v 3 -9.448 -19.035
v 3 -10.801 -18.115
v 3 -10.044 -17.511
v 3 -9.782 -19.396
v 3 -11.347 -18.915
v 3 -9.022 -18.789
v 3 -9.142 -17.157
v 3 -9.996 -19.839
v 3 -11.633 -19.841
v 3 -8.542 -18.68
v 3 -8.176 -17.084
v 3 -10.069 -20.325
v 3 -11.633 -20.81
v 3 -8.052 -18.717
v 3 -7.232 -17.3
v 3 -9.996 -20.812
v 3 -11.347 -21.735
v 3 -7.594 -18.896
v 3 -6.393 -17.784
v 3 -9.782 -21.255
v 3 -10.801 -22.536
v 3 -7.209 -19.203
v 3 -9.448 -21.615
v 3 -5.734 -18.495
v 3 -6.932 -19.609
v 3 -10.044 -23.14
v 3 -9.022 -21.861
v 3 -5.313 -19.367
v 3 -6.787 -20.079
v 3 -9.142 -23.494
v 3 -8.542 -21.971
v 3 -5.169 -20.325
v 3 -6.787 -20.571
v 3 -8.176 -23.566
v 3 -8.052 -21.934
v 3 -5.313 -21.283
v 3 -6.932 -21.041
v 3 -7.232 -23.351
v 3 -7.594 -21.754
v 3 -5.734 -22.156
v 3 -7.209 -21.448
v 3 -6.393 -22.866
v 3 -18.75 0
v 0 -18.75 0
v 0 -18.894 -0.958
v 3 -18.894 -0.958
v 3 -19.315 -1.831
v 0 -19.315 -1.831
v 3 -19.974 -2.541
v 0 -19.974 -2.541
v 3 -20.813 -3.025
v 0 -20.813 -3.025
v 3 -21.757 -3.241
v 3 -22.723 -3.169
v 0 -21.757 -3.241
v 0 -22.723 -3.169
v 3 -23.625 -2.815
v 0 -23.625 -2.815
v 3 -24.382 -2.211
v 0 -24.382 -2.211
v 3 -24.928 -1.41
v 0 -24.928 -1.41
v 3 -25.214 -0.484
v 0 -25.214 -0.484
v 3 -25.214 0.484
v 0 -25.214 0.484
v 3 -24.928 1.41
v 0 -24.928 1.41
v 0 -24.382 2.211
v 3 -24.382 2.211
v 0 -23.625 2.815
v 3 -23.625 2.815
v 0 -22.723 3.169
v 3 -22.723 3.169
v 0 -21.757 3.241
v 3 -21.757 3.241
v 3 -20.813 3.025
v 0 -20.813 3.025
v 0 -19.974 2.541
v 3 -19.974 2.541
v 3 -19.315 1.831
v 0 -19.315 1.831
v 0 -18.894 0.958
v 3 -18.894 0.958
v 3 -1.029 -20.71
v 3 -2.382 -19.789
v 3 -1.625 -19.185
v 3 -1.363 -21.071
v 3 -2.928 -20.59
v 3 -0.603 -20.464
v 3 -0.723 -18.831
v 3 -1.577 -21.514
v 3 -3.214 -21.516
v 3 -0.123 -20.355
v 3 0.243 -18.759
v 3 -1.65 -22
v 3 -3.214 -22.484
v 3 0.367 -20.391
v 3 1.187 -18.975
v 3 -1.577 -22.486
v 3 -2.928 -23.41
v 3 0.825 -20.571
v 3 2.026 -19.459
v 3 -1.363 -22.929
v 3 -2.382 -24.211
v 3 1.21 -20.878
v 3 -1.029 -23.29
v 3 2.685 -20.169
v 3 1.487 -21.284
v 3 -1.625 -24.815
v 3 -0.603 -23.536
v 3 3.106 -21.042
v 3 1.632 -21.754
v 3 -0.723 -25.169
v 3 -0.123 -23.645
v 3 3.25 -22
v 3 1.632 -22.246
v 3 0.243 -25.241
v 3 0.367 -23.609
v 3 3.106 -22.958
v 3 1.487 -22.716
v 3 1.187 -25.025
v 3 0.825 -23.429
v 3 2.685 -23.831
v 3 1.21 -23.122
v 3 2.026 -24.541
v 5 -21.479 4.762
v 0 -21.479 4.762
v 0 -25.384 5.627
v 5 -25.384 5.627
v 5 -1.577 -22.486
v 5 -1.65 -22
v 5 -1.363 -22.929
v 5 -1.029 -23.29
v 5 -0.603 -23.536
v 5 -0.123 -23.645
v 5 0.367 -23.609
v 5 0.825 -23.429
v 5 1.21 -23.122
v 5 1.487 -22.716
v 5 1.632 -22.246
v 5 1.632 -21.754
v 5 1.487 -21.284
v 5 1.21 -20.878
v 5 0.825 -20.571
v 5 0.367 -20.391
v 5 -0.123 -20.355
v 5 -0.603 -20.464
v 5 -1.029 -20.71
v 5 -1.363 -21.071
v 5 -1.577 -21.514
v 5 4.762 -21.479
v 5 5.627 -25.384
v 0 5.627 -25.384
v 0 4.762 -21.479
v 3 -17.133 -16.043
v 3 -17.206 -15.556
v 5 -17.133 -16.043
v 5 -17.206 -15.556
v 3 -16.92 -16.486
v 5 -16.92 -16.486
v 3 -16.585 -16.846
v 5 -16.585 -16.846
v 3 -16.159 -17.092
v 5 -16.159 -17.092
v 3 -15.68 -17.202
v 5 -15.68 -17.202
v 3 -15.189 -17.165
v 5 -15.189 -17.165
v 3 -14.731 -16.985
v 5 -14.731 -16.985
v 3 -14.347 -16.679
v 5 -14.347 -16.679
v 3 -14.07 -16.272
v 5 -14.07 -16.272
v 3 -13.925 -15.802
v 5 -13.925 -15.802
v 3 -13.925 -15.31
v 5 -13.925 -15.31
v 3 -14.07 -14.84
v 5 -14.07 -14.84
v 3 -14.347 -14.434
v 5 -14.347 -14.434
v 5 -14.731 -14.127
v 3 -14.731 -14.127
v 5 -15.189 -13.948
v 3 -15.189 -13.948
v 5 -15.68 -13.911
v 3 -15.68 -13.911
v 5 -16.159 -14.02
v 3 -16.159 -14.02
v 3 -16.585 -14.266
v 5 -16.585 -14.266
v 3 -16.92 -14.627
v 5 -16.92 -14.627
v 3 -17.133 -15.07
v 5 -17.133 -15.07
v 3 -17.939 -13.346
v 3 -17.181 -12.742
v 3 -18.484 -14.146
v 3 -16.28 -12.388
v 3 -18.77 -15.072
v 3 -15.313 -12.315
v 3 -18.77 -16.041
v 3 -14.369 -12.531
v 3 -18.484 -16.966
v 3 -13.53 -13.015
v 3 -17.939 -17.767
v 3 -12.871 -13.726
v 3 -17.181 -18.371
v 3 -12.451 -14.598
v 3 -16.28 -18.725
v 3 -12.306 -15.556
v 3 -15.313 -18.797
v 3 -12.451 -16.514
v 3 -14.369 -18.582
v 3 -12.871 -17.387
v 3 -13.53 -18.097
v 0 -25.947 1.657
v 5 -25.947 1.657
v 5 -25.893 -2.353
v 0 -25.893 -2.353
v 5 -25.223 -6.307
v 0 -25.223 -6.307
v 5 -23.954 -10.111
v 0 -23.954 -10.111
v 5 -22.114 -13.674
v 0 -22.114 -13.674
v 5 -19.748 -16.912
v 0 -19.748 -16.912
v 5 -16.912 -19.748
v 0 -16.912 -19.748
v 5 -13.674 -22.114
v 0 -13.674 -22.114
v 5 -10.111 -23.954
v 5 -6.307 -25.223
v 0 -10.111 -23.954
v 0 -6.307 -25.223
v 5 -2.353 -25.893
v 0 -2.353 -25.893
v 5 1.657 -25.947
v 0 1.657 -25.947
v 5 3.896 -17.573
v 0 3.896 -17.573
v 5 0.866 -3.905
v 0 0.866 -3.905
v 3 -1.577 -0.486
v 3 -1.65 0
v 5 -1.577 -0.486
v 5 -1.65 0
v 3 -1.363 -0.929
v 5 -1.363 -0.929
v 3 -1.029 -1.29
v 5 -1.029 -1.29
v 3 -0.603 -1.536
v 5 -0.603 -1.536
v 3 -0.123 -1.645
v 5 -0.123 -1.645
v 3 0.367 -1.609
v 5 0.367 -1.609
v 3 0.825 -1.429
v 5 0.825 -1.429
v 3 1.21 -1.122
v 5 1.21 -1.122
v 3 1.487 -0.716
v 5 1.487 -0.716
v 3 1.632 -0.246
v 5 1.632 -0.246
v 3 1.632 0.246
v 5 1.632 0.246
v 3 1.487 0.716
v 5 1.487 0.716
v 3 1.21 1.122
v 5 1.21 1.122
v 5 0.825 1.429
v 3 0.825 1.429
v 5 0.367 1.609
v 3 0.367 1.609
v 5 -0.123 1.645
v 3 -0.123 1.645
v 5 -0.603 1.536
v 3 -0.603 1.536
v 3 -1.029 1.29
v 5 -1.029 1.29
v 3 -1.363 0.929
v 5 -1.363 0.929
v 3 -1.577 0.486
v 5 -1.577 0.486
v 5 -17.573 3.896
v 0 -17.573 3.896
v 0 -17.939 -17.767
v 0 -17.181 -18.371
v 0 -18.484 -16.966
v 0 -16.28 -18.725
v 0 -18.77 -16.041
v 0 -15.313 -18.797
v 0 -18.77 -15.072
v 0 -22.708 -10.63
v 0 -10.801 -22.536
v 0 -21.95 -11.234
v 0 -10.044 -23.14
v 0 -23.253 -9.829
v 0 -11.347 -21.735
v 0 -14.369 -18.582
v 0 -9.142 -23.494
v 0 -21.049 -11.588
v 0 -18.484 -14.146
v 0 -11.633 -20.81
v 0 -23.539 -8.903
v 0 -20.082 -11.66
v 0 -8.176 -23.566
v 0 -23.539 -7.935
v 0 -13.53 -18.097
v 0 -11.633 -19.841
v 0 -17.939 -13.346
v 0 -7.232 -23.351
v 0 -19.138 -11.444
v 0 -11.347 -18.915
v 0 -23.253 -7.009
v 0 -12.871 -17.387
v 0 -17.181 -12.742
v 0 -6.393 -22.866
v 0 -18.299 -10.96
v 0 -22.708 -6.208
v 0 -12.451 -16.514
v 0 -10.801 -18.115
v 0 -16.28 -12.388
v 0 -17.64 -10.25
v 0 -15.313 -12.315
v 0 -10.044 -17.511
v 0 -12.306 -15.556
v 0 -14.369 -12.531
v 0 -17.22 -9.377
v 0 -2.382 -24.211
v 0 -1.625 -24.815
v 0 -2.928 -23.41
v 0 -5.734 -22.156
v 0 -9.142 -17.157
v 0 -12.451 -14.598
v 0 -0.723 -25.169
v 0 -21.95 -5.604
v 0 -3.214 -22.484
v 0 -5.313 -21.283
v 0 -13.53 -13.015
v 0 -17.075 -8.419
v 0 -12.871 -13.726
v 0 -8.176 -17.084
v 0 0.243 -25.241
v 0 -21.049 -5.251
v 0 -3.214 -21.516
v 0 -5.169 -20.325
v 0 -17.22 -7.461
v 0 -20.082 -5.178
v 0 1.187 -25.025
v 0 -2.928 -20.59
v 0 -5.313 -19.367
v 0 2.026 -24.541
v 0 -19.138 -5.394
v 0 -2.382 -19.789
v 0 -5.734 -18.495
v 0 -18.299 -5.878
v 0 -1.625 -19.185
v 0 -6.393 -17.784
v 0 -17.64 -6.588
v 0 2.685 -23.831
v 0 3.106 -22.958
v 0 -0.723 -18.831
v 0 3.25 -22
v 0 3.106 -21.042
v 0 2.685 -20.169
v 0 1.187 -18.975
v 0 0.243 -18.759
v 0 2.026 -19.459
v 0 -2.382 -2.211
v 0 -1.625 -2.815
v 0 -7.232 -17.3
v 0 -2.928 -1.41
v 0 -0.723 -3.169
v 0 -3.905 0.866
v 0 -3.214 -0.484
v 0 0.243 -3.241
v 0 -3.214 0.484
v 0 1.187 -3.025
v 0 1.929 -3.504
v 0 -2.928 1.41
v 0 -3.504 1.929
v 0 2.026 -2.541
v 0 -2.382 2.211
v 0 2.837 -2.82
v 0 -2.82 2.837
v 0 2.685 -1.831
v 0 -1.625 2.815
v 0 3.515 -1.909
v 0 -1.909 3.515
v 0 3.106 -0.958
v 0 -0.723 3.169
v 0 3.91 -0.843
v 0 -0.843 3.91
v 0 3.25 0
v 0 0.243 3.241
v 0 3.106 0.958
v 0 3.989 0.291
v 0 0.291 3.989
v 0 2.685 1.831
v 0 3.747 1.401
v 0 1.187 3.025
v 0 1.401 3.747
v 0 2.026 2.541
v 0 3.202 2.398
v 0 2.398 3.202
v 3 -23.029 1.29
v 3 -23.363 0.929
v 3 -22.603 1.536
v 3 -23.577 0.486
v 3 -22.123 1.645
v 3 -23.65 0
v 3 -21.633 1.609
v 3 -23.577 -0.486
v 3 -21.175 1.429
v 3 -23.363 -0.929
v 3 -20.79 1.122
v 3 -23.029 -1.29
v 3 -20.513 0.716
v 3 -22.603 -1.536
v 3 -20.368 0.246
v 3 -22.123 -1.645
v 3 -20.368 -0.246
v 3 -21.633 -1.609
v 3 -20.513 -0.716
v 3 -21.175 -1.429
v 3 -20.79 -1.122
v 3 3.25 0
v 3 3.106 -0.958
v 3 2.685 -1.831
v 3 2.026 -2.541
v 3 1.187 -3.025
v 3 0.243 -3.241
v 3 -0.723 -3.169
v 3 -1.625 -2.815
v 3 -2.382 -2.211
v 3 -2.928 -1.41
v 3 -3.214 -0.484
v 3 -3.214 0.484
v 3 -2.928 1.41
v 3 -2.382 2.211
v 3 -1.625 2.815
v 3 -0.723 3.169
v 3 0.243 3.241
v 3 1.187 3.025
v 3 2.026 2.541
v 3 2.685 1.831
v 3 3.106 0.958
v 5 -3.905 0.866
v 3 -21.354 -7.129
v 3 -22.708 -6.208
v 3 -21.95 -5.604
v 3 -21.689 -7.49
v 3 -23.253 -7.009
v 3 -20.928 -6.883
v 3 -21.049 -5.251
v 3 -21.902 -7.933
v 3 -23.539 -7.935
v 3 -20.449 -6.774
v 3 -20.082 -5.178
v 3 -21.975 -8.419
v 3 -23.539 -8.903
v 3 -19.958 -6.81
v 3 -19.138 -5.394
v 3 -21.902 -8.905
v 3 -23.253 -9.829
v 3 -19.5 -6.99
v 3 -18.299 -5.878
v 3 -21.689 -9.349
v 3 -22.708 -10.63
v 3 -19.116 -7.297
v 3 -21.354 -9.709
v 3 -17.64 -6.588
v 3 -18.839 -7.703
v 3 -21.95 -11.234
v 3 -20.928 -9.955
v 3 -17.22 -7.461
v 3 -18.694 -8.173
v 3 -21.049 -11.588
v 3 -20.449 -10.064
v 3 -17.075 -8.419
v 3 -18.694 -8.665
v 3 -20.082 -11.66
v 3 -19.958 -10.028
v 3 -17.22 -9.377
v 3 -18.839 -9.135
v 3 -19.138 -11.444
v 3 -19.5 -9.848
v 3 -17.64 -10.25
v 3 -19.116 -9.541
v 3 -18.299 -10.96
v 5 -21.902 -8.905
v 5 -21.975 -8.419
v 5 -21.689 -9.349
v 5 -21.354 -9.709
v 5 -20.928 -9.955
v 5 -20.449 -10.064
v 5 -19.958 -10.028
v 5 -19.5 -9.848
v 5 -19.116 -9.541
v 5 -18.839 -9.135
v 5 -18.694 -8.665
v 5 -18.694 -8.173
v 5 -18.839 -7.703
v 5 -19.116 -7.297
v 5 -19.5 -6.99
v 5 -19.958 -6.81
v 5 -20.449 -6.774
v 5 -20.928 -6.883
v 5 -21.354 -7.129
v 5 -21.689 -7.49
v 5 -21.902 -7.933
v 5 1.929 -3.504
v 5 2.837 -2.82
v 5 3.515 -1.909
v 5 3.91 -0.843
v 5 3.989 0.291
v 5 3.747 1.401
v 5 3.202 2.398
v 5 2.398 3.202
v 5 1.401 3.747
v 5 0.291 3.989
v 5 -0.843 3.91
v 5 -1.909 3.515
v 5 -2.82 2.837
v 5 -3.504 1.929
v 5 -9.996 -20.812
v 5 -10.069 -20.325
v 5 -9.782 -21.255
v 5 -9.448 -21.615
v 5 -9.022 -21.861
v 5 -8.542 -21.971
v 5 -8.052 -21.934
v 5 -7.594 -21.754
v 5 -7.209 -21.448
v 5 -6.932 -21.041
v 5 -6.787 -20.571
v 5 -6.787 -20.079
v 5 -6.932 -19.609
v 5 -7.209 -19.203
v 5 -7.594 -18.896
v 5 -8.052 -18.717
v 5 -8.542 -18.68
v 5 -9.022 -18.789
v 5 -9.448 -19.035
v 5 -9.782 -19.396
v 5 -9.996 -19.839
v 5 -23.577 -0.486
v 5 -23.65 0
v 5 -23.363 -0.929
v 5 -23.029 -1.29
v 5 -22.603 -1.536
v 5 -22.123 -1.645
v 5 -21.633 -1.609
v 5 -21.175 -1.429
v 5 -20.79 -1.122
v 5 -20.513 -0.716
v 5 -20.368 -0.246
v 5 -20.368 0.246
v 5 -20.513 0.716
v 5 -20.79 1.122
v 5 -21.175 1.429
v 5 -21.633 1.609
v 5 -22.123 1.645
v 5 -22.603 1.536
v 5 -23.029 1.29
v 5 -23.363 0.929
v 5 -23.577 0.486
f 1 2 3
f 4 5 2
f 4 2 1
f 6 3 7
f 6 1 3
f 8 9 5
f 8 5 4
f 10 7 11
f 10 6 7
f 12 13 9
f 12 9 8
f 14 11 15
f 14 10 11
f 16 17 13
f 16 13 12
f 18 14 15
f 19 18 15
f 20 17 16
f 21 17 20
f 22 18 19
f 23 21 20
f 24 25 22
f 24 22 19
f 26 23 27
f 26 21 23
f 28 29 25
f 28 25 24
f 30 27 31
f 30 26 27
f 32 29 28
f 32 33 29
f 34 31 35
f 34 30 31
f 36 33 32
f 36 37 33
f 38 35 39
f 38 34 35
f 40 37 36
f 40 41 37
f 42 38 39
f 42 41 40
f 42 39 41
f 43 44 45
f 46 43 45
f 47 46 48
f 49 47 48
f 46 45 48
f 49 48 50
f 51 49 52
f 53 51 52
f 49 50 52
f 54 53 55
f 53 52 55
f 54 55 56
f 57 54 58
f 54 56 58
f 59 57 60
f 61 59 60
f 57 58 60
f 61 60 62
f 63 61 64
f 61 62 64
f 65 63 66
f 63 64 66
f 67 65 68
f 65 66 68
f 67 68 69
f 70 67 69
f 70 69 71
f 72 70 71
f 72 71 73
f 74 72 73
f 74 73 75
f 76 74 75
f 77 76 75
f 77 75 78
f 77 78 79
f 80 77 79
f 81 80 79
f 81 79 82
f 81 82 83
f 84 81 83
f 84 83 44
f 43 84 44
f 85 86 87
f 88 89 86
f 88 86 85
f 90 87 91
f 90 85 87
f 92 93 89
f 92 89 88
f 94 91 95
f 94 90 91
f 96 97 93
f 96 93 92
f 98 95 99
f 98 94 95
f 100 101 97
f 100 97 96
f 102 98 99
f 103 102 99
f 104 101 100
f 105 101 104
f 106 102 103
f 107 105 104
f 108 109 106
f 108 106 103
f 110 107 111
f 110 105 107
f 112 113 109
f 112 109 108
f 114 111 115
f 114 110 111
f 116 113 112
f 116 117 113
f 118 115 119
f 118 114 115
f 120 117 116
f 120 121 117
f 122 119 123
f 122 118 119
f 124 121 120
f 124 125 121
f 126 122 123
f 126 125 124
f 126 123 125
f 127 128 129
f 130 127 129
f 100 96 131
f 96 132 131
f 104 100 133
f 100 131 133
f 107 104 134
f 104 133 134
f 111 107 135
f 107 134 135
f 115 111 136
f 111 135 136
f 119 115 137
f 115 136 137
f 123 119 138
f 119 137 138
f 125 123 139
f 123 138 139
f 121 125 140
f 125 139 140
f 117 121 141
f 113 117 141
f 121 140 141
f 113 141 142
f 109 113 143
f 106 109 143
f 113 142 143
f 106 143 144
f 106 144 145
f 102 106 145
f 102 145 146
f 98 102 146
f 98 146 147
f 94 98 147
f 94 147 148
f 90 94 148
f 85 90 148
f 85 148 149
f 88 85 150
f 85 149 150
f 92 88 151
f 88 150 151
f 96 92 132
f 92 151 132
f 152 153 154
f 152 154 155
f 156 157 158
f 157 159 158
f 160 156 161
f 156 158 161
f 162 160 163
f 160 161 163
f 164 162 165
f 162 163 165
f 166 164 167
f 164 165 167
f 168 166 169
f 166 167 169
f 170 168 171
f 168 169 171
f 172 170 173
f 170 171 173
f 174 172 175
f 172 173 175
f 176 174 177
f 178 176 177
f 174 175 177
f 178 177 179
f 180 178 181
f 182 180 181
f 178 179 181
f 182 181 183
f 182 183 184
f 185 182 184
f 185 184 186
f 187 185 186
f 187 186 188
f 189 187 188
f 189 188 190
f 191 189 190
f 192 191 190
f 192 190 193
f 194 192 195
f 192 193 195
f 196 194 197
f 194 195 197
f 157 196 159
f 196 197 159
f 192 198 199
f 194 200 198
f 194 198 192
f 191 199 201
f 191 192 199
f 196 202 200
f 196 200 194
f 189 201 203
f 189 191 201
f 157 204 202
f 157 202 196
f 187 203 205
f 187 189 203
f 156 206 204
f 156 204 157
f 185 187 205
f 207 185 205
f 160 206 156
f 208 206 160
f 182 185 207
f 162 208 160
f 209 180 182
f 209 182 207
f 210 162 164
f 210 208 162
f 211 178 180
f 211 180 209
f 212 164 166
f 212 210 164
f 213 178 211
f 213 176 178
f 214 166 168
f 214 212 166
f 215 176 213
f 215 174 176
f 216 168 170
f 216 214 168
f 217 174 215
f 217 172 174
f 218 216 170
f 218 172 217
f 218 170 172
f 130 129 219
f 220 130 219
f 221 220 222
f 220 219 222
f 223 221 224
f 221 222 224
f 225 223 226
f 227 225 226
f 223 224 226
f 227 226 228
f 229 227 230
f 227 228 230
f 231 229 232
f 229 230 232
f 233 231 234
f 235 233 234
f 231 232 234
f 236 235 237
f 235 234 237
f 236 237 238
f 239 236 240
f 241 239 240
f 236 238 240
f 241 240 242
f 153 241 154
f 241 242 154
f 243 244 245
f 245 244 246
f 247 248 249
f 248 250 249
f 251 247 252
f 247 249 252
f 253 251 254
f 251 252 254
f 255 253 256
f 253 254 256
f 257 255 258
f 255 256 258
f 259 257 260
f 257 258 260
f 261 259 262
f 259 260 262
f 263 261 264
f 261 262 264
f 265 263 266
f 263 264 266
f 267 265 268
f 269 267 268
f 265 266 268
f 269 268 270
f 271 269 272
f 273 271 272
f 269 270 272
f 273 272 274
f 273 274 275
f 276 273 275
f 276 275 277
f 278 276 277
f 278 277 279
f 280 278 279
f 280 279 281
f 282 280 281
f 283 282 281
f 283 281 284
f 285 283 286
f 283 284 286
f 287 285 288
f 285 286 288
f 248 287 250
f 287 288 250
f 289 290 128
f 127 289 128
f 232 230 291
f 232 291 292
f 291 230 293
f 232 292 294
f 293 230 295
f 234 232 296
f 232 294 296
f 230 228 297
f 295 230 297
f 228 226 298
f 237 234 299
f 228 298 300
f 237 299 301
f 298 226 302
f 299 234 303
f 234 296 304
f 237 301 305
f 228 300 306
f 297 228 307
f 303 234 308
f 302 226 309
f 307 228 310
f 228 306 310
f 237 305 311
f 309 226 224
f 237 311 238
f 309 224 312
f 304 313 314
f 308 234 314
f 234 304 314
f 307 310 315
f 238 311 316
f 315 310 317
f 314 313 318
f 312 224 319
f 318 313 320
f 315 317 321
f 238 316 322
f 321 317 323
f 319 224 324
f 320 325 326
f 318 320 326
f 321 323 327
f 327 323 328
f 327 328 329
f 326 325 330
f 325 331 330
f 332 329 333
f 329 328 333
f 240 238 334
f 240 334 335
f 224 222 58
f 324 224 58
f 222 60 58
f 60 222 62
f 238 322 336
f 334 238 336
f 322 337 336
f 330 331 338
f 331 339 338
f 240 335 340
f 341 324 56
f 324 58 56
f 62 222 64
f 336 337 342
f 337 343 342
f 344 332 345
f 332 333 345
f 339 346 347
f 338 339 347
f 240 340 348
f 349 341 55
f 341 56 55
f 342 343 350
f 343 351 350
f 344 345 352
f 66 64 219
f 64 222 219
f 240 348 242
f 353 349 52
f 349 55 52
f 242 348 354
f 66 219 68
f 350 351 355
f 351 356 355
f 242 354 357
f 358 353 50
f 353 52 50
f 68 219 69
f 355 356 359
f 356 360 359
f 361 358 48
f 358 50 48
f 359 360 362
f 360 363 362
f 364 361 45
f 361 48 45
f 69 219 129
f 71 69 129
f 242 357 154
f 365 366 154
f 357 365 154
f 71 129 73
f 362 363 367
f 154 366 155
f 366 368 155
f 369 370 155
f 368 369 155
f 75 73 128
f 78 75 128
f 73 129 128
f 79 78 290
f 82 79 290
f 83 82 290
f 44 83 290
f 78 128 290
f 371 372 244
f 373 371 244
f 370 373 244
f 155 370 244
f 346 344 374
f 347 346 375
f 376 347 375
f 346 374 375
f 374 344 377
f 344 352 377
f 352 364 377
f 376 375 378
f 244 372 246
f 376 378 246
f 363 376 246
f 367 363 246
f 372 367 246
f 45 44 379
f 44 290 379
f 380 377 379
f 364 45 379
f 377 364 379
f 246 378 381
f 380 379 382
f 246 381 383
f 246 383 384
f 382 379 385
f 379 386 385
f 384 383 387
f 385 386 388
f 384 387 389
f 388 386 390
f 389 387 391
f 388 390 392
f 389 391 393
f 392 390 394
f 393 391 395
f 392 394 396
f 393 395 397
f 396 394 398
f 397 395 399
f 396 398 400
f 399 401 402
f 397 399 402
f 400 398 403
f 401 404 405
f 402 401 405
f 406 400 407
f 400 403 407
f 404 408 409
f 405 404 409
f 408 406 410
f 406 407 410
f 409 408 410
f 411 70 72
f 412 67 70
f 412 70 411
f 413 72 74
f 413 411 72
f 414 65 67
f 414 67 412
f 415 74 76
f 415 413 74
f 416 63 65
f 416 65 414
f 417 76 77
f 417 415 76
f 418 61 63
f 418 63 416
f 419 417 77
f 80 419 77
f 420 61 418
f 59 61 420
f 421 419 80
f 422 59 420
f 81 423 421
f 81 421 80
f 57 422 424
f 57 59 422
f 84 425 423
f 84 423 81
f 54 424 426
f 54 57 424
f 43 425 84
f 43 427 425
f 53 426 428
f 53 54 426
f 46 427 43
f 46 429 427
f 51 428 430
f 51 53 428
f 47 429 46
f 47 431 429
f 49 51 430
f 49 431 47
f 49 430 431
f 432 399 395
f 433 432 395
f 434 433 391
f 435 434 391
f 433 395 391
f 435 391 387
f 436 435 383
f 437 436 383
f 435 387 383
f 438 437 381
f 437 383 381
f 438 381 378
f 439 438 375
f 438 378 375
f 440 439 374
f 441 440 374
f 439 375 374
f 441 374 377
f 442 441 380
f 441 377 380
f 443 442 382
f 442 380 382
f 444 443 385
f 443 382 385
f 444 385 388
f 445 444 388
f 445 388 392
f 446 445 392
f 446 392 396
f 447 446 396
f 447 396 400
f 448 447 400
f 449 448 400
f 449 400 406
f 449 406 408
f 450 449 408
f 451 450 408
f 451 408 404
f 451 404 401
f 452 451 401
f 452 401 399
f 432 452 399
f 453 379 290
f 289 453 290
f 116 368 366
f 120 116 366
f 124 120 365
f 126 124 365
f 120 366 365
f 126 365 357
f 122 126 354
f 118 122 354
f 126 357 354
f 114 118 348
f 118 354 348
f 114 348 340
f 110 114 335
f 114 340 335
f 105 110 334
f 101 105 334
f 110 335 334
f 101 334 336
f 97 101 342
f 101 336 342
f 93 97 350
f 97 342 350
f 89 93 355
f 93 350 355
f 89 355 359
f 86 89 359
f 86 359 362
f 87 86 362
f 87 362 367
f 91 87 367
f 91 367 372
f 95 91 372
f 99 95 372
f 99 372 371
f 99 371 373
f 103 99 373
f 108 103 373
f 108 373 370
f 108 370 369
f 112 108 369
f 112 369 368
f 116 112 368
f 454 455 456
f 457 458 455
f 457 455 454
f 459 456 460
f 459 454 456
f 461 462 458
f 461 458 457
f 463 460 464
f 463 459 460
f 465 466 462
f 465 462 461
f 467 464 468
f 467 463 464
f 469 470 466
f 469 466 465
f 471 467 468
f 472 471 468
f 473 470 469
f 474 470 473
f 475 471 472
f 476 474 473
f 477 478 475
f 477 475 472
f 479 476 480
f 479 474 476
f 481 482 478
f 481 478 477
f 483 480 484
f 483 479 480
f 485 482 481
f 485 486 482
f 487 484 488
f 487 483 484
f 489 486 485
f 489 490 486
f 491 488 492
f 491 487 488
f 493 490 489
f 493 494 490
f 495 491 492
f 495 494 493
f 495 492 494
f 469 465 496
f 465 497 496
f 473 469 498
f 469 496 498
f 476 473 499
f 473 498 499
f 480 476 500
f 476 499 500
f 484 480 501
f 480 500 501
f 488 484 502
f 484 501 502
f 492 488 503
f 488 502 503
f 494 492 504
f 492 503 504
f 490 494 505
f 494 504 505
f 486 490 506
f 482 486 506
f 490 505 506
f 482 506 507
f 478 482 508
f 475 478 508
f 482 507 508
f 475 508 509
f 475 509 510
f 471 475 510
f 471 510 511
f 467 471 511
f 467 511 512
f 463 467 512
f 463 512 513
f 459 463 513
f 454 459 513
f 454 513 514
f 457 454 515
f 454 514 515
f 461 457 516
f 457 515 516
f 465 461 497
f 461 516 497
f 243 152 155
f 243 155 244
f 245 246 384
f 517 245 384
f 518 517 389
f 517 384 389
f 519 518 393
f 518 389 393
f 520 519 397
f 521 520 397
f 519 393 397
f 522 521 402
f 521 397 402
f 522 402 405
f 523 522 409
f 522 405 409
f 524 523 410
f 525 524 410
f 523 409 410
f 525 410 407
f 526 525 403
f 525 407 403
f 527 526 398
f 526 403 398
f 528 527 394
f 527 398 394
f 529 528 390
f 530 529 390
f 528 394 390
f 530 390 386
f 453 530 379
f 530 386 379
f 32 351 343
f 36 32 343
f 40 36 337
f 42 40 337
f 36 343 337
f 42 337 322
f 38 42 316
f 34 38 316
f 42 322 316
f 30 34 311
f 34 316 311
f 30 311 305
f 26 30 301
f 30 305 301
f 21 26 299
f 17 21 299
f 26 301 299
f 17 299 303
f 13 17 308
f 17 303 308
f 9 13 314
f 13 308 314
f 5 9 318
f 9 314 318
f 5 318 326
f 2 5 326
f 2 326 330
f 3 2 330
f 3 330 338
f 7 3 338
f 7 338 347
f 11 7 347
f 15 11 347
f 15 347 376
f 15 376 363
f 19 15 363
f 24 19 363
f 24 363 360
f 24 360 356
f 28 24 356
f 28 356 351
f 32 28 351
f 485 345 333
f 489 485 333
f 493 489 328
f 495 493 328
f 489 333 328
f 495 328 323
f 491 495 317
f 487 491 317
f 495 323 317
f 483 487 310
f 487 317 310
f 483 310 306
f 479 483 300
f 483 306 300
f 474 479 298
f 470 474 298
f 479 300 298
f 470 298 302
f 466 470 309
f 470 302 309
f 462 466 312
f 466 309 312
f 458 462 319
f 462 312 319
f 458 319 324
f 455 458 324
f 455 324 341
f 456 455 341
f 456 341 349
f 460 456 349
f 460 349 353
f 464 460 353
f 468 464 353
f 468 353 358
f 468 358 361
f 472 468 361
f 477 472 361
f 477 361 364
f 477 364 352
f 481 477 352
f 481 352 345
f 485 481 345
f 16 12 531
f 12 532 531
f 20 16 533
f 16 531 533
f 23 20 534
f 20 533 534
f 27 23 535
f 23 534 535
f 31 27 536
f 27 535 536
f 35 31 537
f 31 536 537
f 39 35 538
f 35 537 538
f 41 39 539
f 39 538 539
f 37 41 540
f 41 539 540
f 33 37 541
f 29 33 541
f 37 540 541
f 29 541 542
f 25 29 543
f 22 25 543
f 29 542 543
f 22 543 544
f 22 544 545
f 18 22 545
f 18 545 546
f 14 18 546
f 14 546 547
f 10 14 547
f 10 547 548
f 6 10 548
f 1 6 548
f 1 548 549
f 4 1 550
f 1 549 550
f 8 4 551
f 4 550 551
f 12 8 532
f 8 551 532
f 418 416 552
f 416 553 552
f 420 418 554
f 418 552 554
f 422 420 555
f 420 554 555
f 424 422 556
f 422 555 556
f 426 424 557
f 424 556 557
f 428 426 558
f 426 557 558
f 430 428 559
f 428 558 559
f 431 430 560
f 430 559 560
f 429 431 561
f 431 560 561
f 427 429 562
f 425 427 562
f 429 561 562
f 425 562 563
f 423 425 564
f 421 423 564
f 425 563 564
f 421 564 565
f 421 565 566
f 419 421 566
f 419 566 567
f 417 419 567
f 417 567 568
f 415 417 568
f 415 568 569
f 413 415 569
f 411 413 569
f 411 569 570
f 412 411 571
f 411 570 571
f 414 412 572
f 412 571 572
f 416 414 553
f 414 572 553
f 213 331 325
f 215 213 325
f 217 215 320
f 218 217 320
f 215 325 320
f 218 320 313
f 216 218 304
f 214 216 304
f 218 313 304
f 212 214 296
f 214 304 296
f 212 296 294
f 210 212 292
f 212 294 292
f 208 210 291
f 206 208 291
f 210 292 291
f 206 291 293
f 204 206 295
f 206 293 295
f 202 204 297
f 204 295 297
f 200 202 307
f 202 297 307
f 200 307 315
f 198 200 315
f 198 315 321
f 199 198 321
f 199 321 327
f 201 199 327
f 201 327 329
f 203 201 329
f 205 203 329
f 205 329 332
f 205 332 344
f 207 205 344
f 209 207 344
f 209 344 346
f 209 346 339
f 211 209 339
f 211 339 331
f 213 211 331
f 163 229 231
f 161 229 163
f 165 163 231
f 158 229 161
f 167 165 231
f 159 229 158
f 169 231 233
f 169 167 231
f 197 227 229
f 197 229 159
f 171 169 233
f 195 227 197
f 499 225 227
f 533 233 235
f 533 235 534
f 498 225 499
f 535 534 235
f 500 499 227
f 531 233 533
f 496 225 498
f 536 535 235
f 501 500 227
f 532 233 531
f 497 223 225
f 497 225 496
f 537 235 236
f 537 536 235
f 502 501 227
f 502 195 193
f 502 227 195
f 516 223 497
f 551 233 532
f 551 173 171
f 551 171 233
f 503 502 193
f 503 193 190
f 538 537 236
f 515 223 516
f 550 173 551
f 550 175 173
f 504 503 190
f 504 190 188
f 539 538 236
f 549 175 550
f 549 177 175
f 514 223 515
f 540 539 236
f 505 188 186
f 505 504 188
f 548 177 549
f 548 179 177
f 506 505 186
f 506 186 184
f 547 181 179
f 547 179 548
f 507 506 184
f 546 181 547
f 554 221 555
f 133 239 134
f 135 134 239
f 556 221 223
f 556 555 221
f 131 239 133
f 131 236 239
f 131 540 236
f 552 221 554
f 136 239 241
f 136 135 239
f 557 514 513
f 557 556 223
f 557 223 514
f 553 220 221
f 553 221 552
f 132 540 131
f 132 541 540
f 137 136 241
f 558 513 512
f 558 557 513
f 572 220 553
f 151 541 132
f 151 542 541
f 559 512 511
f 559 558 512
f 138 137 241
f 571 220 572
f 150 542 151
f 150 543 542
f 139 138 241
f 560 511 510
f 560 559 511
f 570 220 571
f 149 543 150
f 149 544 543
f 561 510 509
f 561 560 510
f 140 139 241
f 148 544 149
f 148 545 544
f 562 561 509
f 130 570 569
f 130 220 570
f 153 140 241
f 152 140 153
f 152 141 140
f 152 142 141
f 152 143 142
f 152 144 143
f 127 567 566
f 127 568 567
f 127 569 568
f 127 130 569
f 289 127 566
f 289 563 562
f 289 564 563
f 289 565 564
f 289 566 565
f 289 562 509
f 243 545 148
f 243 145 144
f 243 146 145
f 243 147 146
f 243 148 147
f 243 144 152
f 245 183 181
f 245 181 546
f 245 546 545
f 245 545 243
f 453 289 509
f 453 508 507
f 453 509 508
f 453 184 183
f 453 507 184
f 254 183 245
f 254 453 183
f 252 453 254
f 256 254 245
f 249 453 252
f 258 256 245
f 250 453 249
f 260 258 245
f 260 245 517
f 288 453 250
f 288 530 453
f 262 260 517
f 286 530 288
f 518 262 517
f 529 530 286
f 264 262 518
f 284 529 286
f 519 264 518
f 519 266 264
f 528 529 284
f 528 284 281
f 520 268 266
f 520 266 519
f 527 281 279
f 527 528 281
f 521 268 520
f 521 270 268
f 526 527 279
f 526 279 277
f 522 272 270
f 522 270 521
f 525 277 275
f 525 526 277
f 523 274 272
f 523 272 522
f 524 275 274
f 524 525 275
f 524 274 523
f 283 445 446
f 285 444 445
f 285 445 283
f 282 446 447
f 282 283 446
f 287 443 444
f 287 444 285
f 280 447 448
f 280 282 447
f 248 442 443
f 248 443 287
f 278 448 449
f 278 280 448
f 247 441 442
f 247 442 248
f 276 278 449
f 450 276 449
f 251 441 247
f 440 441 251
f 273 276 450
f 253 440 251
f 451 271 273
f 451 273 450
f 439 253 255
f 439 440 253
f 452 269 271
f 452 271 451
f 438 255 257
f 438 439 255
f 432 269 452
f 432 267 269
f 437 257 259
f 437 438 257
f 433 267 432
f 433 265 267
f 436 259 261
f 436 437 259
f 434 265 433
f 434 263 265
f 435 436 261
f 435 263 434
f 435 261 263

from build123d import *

# Parameters (mm, degrees)
F1_DEPTH       = 5
F2_D           = 3.3
F2_CBORE_D     = 6.5
F2_CBORE_DEPTH = 3


with BuildPart() as f1:
    # F0 (on Right) → F1 (new body)
    with BuildSketch(Plane.YZ):
        with BuildLine():
            Line((-21.4785121566, 4.7616715066), (-25.3836961851, 5.6274299624))
            ThreePointArc((-25.3836961851, 5.6274299624), (-18.3847763109, -18.3847763109), (5.6274299624, -25.3836961851))
            Line((5.6274299624, -25.3836961851), (4.7616715066, -21.4785121566))
            ThreePointArc((4.7616715066, -21.4785121566), (2.3950712467, -21.8692394409), (0, -22))
            ThreePointArc((0, -22), (-4.2919870844, -21.5772761689), (-8.419035512, -20.3253497152))
            ThreePointArc((-8.419035512, -20.3253497152), (-12.2225451264, -18.2923314707), (-15.5563491861, -15.5563491861))
            ThreePointArc((-15.5563491861, -15.5563491861), (-18.2923314707, -12.2225451264), (-20.3253497152, -8.419035512))
            ThreePointArc((-20.3253497152, -8.419035512), (-21.5772761689, -4.2919870844), (-22, 0))
            ThreePointArc((-22, 0), (-21.8692394409, 2.3950712467), (-21.4785121566, 4.7616715066))
        make_face()
        with BuildLine():
            Line((-17.5733281282, 3.8959130509), (-21.4785121566, 4.7616715066))
            ThreePointArc((-21.4785121566, 4.7616715066), (-21.8692394409, 2.3950712467), (-22, 0))
            ThreePointArc((-22, 0), (-21.5772761689, -4.2919870844), (-20.3253497152, -8.419035512))
            ThreePointArc((-20.3253497152, -8.419035512), (-18.2923314707, -12.2225451264), (-15.5563491861, -15.5563491861))
            ThreePointArc((-15.5563491861, -15.5563491861), (-12.2225451264, -18.2923314707), (-8.419035512, -20.3253497152))
            ThreePointArc((-8.419035512, -20.3253497152), (-4.2919870844, -21.5772761689), (0, -22))
            ThreePointArc((0, -22), (2.3950712467, -21.8692394409), (4.7616715066, -21.4785121566))
            Line((4.7616715066, -21.4785121566), (3.8959130509, -17.5733281282))
            ThreePointArc((3.8959130509, -17.5733281282), (-12.7279220614, -12.7279220614), (-17.5733281282, 3.8959130509))
        make_face()
        with BuildLine():
            Line((-3.9051840285, 0.8657584558), (-17.5733281282, 3.8959130509))
            ThreePointArc((-17.5733281282, 3.8959130509), (-12.7279220614, -12.7279220614), (3.8959130509, -17.5733281282))
            Line((3.8959130509, -17.5733281282), (0.8657584558, -3.9051840285))
            Line((0.8657584558, -3.9051840285), (0, 0))
            Line((0, 0), (-3.9051840285, 0.8657584558))
        make_face()
        with BuildLine():
            ThreePointArc((0.8657584558, -3.9051840285), (2.8284271247, 2.8284271247), (-3.9051840285, 0.8657584558))
            Line((-3.9051840285, 0.8657584558), (0, 0))
            Line((0, 0), (0.8657584558, -3.9051840285))
        make_face()
    extrude(amount=F1_DEPTH)

    # F2 (through all)
    with Locations(Plane(origin=(0, 0, 0), x_dir=(0, 1, 0), z_dir=(-1, 0, 0))):
        with Locations((-22, 0), (-20.3253497152, 8.419035512), (-15.5563491861, 15.5563491861), (-8.419035512, 20.3253497152), (0, 22), (0, 0)):
            CounterBoreHole(F2_D / 2, F2_CBORE_D / 2, F2_CBORE_DEPTH)


solid = f1.part
